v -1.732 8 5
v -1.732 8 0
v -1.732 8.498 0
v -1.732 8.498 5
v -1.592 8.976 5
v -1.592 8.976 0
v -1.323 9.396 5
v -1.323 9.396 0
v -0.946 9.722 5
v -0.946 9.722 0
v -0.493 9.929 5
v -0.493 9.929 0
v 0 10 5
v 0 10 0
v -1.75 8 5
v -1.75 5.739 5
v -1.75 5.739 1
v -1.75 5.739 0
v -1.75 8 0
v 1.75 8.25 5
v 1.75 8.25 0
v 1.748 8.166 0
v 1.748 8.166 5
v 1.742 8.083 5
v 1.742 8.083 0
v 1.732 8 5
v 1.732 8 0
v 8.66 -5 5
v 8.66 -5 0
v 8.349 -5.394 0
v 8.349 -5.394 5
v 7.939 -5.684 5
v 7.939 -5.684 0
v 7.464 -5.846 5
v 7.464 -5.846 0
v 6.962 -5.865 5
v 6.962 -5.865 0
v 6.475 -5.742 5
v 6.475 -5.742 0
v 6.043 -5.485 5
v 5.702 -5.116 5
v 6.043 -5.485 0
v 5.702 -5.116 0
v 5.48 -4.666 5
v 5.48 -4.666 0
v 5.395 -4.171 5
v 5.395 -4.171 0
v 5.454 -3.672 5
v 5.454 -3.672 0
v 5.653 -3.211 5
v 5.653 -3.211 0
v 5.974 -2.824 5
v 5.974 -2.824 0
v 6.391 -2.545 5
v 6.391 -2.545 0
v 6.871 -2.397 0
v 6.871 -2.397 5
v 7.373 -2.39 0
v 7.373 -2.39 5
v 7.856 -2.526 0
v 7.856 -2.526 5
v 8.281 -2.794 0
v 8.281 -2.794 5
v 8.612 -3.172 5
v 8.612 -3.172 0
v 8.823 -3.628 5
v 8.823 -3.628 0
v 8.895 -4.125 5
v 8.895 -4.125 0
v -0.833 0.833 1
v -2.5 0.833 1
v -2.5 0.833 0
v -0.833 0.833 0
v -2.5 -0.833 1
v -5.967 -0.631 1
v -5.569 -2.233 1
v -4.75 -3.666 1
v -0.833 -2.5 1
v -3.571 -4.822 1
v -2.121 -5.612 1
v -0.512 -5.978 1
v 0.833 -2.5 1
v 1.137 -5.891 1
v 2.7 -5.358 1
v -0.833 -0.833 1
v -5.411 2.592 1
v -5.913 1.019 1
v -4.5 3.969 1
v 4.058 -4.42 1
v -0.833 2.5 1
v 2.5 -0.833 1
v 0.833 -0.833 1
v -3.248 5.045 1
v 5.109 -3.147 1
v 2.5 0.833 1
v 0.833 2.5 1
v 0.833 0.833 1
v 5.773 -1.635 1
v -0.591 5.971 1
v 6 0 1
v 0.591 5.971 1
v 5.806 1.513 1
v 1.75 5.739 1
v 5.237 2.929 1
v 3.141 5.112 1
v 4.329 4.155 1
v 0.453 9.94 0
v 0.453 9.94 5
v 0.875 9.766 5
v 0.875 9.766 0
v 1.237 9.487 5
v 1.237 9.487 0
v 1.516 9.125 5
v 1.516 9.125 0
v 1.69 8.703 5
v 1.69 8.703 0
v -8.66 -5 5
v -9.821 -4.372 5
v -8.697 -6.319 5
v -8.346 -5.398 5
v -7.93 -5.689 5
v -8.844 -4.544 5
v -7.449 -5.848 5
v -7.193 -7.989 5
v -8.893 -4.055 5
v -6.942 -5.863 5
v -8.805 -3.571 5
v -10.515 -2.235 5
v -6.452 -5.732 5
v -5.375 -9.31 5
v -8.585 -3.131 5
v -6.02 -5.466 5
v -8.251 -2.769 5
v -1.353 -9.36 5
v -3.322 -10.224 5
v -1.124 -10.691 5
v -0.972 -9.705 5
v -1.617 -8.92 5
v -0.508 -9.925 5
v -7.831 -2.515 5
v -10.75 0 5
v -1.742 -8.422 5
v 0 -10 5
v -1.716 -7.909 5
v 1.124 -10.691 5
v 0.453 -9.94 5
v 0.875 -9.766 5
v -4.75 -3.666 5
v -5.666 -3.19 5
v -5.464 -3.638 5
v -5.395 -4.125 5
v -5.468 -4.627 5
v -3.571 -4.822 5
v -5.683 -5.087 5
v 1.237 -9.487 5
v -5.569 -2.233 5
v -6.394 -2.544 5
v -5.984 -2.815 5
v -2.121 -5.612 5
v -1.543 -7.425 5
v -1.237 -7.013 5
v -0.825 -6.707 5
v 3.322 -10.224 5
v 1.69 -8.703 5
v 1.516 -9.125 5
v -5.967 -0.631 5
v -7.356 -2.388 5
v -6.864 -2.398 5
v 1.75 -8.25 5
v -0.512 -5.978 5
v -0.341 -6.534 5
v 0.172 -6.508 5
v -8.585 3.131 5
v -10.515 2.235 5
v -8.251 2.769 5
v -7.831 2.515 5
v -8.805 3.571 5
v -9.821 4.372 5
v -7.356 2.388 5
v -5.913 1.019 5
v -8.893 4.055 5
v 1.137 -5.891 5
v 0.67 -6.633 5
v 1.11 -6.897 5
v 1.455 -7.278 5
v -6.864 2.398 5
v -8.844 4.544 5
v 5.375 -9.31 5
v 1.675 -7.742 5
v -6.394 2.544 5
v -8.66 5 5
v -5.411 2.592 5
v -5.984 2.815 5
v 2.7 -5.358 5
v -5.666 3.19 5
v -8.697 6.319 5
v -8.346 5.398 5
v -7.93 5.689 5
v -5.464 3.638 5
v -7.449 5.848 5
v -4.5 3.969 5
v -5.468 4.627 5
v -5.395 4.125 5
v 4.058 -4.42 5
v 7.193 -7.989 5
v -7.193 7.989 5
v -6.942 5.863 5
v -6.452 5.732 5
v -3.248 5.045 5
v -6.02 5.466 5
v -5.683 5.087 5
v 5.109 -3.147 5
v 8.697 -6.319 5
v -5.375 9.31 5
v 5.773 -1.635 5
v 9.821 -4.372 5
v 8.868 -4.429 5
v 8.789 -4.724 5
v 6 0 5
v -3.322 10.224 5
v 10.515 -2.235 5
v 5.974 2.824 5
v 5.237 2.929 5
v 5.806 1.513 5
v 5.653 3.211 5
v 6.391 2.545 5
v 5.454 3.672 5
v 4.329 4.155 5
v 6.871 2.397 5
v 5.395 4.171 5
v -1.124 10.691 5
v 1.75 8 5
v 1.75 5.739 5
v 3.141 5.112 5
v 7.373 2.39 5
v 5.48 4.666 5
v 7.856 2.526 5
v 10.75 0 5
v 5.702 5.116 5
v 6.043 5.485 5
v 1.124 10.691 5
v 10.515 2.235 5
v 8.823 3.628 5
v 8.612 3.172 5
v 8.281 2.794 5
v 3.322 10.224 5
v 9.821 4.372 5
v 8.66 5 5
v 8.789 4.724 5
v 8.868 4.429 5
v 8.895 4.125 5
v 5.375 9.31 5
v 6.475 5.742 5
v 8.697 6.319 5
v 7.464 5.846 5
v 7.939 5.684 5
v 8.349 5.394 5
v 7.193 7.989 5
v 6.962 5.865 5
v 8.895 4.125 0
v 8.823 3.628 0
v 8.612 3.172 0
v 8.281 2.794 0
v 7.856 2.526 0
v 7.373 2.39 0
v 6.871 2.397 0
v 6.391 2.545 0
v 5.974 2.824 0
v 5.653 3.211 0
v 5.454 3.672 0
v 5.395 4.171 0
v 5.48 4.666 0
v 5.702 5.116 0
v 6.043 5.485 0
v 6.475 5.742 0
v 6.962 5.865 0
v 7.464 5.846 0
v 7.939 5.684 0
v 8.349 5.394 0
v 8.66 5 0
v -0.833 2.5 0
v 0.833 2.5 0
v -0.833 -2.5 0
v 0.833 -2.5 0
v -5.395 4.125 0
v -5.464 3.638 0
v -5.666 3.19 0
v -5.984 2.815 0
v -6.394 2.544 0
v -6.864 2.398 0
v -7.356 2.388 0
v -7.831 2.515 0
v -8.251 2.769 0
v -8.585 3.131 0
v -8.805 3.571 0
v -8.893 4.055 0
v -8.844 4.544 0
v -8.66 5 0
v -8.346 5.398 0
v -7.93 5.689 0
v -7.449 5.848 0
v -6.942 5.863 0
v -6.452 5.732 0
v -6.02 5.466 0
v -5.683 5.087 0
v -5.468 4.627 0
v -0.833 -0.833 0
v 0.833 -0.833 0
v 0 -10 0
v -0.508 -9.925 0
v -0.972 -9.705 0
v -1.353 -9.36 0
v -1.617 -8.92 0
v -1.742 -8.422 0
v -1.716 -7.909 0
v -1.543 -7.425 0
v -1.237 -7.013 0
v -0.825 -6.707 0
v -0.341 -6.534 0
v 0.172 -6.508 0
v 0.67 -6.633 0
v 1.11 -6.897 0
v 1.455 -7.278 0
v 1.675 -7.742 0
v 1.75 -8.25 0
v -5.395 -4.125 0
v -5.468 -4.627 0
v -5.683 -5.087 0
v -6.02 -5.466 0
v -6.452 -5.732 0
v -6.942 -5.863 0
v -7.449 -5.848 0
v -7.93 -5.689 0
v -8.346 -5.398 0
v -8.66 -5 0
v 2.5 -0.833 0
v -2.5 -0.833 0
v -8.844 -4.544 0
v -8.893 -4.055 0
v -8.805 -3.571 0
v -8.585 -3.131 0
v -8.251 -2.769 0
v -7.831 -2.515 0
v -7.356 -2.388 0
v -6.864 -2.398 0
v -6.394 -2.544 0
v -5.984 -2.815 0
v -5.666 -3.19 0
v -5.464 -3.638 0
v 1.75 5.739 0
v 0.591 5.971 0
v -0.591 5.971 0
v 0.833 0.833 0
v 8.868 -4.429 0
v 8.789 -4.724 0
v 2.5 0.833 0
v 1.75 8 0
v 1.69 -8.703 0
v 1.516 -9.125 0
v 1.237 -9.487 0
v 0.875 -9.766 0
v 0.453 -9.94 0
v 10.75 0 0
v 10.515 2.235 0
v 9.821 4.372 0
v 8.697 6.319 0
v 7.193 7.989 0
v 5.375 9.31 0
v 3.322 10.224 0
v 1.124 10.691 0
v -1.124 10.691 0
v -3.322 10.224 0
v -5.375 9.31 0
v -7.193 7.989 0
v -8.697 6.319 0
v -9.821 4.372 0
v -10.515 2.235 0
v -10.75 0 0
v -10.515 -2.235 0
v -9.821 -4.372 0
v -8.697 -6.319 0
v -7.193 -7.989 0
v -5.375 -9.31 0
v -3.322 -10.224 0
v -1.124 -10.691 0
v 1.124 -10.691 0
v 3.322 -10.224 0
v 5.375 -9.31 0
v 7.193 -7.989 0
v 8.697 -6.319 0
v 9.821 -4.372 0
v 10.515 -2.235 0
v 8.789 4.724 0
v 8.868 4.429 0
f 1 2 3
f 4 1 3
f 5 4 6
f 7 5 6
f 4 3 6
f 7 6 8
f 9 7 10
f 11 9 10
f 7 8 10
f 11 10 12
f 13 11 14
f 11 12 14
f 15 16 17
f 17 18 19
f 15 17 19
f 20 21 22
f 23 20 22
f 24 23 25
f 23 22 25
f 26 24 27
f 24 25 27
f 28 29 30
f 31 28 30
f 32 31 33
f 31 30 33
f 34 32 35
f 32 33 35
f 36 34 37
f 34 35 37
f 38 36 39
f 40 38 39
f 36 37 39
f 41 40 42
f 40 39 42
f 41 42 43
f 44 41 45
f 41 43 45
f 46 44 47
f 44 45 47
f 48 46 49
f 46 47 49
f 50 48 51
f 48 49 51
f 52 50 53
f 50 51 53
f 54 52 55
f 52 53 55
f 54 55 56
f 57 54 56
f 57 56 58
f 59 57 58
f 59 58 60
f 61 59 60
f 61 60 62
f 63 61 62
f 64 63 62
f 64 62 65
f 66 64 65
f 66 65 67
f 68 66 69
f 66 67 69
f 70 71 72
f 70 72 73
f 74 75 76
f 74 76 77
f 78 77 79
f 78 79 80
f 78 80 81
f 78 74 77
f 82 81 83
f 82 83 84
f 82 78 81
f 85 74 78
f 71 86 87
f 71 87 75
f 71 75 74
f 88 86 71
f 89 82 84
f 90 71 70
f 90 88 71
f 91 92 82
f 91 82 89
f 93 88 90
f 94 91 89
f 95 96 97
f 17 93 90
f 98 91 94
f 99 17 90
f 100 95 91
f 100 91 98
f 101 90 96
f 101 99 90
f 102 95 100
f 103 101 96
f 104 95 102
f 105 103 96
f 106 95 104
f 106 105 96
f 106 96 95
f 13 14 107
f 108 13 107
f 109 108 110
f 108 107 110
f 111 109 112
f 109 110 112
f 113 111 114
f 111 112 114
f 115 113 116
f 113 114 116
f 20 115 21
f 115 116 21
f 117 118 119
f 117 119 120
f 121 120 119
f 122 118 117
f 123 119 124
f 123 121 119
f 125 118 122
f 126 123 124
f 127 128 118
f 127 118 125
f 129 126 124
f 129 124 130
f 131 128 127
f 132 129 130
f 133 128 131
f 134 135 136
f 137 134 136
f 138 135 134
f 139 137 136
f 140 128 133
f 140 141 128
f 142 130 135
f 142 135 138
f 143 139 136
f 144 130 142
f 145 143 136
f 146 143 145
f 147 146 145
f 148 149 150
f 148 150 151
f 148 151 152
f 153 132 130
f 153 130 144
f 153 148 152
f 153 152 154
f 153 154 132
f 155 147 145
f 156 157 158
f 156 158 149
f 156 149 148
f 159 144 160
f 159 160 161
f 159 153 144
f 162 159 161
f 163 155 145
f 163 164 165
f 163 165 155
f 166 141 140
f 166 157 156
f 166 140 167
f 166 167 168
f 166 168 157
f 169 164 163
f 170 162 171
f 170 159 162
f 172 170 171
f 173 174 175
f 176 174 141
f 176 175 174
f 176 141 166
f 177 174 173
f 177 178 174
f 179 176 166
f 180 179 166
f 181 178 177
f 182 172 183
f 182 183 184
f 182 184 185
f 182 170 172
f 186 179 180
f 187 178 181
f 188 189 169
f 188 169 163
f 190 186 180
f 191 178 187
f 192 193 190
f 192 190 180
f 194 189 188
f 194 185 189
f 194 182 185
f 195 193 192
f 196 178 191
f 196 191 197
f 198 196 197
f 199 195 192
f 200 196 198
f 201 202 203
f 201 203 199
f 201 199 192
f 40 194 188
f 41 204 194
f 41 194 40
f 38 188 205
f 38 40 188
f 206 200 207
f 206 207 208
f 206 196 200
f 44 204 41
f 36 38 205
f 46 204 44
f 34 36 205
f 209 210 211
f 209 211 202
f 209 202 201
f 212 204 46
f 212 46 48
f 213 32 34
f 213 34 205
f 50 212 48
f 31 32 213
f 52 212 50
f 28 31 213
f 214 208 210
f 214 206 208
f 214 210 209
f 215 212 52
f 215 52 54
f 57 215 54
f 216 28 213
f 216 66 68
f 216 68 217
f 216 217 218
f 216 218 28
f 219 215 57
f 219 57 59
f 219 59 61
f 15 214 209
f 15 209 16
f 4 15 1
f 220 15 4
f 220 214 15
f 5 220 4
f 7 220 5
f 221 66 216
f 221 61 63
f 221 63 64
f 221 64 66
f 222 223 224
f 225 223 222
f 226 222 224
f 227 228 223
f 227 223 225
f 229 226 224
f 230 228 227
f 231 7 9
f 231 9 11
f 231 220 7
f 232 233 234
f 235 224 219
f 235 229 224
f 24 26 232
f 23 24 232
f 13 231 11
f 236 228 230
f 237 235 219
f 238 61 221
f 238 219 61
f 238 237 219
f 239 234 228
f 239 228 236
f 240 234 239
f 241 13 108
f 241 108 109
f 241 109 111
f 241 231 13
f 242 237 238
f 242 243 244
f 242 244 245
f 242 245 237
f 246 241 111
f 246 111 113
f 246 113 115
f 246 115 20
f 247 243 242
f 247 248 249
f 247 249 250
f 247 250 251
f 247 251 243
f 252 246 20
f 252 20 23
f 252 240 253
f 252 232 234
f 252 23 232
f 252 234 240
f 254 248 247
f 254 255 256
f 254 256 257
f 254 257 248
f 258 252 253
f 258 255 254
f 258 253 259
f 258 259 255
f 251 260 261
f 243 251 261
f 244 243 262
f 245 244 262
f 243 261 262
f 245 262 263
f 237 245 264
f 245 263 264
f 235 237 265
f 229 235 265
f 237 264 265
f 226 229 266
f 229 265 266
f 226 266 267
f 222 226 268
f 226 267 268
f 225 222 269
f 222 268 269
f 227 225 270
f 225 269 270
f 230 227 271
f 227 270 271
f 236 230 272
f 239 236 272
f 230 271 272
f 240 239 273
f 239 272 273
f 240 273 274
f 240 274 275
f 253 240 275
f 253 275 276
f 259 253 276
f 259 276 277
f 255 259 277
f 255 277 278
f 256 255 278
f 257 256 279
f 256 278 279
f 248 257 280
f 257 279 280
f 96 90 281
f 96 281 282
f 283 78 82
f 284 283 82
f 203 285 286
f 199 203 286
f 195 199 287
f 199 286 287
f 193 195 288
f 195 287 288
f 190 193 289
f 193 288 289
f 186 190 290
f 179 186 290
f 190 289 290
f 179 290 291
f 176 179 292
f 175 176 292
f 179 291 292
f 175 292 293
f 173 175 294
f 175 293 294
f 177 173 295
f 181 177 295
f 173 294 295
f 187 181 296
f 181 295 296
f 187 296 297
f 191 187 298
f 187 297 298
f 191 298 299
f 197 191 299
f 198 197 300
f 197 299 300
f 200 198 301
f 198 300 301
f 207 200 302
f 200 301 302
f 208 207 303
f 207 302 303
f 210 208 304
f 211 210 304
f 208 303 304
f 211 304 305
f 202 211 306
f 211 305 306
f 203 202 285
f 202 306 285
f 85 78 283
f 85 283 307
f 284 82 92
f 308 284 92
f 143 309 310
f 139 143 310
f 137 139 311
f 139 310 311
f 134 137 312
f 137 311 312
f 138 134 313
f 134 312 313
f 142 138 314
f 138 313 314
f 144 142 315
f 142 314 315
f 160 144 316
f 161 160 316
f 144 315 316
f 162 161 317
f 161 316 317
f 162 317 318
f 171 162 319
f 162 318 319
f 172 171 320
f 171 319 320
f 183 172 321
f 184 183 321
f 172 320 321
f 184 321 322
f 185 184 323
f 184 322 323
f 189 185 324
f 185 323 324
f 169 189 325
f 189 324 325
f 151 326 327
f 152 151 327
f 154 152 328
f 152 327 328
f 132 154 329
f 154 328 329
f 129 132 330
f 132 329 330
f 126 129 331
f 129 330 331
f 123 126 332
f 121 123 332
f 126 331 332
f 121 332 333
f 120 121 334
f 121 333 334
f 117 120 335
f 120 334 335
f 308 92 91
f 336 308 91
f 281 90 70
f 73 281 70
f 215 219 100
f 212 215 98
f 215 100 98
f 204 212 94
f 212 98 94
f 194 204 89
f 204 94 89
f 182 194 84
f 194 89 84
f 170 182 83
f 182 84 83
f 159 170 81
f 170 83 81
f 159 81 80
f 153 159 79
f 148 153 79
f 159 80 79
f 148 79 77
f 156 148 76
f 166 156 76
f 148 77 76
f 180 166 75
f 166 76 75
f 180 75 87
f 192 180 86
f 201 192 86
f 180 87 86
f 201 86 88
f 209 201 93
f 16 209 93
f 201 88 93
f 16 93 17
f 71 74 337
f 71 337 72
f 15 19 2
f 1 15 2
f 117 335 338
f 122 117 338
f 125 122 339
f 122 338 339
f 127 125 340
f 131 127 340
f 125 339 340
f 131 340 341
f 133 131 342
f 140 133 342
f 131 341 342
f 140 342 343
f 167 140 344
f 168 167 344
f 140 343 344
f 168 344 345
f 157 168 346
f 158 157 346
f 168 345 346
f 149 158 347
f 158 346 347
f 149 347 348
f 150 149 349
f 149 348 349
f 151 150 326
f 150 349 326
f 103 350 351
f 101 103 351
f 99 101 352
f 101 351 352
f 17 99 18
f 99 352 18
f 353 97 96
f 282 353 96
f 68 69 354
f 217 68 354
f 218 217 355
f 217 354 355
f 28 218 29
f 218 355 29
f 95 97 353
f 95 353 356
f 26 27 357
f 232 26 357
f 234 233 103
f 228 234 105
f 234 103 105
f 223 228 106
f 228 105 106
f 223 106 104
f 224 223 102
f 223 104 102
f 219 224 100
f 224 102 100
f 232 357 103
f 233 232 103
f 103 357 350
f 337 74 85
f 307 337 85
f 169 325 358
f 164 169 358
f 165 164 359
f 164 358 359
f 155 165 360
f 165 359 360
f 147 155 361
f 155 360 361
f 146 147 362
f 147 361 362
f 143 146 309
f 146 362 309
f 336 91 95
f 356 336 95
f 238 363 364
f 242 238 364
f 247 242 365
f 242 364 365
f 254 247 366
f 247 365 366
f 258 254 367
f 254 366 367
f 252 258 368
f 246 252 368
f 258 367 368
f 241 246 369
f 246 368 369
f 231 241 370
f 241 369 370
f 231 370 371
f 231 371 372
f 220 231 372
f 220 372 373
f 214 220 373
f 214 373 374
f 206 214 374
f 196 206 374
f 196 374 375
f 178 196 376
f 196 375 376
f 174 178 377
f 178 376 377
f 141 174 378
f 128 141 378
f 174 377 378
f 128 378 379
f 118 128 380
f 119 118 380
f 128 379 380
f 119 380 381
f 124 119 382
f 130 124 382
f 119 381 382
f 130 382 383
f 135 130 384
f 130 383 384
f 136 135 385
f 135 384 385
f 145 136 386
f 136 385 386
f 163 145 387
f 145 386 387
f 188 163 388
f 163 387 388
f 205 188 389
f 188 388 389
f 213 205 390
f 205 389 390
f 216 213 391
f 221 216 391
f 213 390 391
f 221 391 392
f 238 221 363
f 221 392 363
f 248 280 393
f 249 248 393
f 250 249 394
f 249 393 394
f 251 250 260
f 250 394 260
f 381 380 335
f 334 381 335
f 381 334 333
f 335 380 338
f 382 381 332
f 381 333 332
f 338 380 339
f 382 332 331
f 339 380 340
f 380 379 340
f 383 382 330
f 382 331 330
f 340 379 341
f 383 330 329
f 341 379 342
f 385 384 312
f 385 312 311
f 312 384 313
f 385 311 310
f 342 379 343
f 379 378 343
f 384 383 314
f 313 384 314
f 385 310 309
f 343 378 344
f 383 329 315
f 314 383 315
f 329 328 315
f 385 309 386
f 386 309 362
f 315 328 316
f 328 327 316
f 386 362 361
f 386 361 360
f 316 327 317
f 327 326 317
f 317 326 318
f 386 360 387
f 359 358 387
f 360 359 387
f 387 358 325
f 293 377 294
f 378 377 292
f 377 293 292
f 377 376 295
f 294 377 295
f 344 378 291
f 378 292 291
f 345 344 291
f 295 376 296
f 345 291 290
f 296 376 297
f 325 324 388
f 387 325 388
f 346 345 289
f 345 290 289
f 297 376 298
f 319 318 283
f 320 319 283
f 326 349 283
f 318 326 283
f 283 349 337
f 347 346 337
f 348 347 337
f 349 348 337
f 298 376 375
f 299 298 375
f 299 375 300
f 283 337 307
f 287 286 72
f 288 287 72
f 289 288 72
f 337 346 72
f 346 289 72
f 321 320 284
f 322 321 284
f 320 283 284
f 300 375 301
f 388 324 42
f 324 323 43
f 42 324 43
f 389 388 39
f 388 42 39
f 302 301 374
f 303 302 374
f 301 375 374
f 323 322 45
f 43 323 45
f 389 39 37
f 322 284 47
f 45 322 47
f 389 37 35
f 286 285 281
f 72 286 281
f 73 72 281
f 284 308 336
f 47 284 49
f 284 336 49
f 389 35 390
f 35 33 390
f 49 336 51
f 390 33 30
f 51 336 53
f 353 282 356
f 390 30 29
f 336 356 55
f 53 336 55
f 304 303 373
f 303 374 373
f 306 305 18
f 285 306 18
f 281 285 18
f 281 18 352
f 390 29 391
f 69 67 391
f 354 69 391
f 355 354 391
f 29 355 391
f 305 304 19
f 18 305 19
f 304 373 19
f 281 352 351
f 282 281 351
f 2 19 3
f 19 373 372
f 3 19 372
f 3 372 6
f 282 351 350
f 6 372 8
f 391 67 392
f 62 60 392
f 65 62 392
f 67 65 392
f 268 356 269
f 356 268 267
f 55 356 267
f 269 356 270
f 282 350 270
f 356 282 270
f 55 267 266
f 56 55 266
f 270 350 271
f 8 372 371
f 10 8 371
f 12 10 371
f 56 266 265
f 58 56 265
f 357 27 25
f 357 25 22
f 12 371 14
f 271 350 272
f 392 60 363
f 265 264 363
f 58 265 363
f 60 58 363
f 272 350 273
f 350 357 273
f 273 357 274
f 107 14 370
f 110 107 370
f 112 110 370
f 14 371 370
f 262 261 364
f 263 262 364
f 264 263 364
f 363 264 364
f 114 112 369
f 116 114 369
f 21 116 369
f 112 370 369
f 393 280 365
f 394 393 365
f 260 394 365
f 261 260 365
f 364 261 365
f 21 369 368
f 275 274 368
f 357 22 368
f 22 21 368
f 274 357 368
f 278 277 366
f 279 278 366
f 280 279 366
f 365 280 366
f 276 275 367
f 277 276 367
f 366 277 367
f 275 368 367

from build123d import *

# Parameters (mm, degrees)
F1_R     = 10.75
F2_DEPTH = 5
F3_DEPTH = 1
F0_W     = 1.6666666667
F0_H     = 1.6666666667
F4_DEPTH = 12.5


with BuildPart() as f2:
    # F1 (on Top) → F2 (new body)
    with BuildSketch(Plane.XY):
        Circle(F1_R)
        with BuildLine():
            ThreePointArc((-8.6602540538, 4.9999999724), (-5.0000000138, 8.6602540299), (0, 10))
            ThreePointArc((0, 10), (5.0000000138, 8.6602540299), (8.6602540538, 4.9999999724))
            ThreePointArc((8.6602540538, 4.9999999724), (9.659258267, 2.5881904356), (10, 0))
            ThreePointArc((10, 0), (9.6592582663, -2.5881904384), (8.6602540509, -4.9999999774))
            ThreePointArc((8.6602540509, -4.9999999774), (5.0000000086, -8.6602540329), (-6.2e-09, -10))
            ThreePointArc((-6.2e-09, -10), (-5.0000000165, -8.6602540283), (-8.6602540538, -4.9999999724))
            ThreePointArc((-8.6602540538, -4.9999999724), (-10, 0), (-8.6602540538, 4.9999999724))
        make_face(mode=Mode.SUBTRACT)
        with BuildLine():
            ThreePointArc((8.6602540538, 4.9999999724), (5.0000000138, 8.6602540299), (0, 10))
            ThreePointArc((0, 10), (-5.0000000138, 8.6602540299), (-8.6602540538, 4.9999999724))
            ThreePointArc((-8.6602540538, 4.9999999724), (-10, 0), (-8.6602540538, -4.9999999724))
            ThreePointArc((-8.6602540538, -4.9999999724), (-5.0000000165, -8.6602540283), (-6.2e-09, -10))
            ThreePointArc((-6.2e-09, -10), (5.0000000086, -8.6602540329), (8.6602540509, -4.9999999774))
            ThreePointArc((8.6602540509, -4.9999999774), (9.6592582663, -2.5881904384), (10, 0))
            ThreePointArc((10, 0), (9.659258267, 2.5881904356), (8.6602540538, 4.9999999724))
        make_face()
        with BuildLine():
            ThreePointArc((-5.3947095812, -4.125), (-6.6917762677, -5.8153702001), (-8.6602540538, -4.9999999724))
            ThreePointArc((-8.6602540538, -4.9999999724), (-7.5976428947, -2.4346297999), (-5.3947095812, -4.125))
        make_face(mode=Mode.SUBTRACT)
        with BuildLine():
            ThreePointArc((1.75, -8.25), (1.2374368649, -9.4874368693), (-6.2e-09, -10))
            ThreePointArc((-6.2e-09, -10), (-1.2374368649, -7.0125631307), (1.75, -8.25))
        make_face(mode=Mode.SUBTRACT)
        with BuildLine():
            ThreePointArc((8.8947095812, -4.125), (8.8350797806, -4.5779333163), (8.6602540509, -4.9999999774))
            ThreePointArc((8.6602540509, -4.9999999774), (5.4543393818, -3.6720666837), (8.8947095812, -4.125))
        make_face(mode=Mode.SUBTRACT)
        with BuildLine():
            ThreePointArc((-5.3947095812, 4.125), (-7.5976428947, 2.4346297999), (-8.6602540538, 4.9999999724))
            ThreePointArc((-8.6602540538, 4.9999999724), (-6.6917762677, 5.8153702001), (-5.3947095812, 4.125))
        make_face(mode=Mode.SUBTRACT)
        with BuildLine():
            ThreePointArc((1.75, 5.7391201416), (4.8218253805, 3.5707142143), (6, 0))
            ThreePointArc((6, 0), (-3.5707142143, -4.8218253805), (-1.75, 5.7391201416))
            Line((-1.75, 5.7391201416), (-1.75, 8))
            Line((-1.75, 8), (-1.7320508076, 8))
            ThreePointArc((-1.7320508076, 8), (-1.3228756555, 9.3956439237), (0, 10))
            ThreePointArc((0, 10), (1.2374368671, 9.4874368671), (1.75, 8.25))
            ThreePointArc((1.75, 8.25), (1.745506934, 8.1246782406), (1.7320508076, 8))
            Line((1.7320508076, 8), (1.75, 8))
            Line((1.75, 8), (1.75, 5.7391201416))
        make_face(mode=Mode.SUBTRACT)
        with BuildLine():
            ThreePointArc((8.8947095812, 4.125), (5.4543393811, 3.6720666865), (8.6602540538, 4.9999999724))
            ThreePointArc((8.6602540538, 4.9999999724), (8.8350797814, 4.5779333135), (8.8947095812, 4.125))
        make_face(mode=Mode.SUBTRACT)
    extrude(amount=F2_DEPTH)

    # F1 (on Top) → F3 (join)
    with BuildSketch(Plane.XY):
        with BuildLine():
            ThreePointArc((-1.75, 5.7391201416), (-3.5707142143, -4.8218253805), (6, 0))
            ThreePointArc((6, 0), (4.8218253805, 3.5707142143), (1.75, 5.7391201416))
            ThreePointArc((1.75, 5.7391201416), (0, 6), (-1.75, 5.7391201416))
        make_face()
    extrude(amount=F3_DEPTH)

    # F0 (on Top) → F4 (cut, symmetric)
    with BuildSketch(Plane.XY):
        with Locations((0, 1.6666666667)):
            Rectangle(F0_W, F0_H)
        Rectangle(F0_W, F0_H)
        with Locations((-1.6666666667, 0)):
            Rectangle(F0_W, F0_H)
        with Locations((1.6666666667, 0)):
            Rectangle(F0_W, F0_H)
        with Locations((0, -1.6666666667)):
            Rectangle(F0_W, F0_H)
    extrude(amount=F4_DEPTH, both=True, mode=Mode.SUBTRACT)


solid = f2.part
